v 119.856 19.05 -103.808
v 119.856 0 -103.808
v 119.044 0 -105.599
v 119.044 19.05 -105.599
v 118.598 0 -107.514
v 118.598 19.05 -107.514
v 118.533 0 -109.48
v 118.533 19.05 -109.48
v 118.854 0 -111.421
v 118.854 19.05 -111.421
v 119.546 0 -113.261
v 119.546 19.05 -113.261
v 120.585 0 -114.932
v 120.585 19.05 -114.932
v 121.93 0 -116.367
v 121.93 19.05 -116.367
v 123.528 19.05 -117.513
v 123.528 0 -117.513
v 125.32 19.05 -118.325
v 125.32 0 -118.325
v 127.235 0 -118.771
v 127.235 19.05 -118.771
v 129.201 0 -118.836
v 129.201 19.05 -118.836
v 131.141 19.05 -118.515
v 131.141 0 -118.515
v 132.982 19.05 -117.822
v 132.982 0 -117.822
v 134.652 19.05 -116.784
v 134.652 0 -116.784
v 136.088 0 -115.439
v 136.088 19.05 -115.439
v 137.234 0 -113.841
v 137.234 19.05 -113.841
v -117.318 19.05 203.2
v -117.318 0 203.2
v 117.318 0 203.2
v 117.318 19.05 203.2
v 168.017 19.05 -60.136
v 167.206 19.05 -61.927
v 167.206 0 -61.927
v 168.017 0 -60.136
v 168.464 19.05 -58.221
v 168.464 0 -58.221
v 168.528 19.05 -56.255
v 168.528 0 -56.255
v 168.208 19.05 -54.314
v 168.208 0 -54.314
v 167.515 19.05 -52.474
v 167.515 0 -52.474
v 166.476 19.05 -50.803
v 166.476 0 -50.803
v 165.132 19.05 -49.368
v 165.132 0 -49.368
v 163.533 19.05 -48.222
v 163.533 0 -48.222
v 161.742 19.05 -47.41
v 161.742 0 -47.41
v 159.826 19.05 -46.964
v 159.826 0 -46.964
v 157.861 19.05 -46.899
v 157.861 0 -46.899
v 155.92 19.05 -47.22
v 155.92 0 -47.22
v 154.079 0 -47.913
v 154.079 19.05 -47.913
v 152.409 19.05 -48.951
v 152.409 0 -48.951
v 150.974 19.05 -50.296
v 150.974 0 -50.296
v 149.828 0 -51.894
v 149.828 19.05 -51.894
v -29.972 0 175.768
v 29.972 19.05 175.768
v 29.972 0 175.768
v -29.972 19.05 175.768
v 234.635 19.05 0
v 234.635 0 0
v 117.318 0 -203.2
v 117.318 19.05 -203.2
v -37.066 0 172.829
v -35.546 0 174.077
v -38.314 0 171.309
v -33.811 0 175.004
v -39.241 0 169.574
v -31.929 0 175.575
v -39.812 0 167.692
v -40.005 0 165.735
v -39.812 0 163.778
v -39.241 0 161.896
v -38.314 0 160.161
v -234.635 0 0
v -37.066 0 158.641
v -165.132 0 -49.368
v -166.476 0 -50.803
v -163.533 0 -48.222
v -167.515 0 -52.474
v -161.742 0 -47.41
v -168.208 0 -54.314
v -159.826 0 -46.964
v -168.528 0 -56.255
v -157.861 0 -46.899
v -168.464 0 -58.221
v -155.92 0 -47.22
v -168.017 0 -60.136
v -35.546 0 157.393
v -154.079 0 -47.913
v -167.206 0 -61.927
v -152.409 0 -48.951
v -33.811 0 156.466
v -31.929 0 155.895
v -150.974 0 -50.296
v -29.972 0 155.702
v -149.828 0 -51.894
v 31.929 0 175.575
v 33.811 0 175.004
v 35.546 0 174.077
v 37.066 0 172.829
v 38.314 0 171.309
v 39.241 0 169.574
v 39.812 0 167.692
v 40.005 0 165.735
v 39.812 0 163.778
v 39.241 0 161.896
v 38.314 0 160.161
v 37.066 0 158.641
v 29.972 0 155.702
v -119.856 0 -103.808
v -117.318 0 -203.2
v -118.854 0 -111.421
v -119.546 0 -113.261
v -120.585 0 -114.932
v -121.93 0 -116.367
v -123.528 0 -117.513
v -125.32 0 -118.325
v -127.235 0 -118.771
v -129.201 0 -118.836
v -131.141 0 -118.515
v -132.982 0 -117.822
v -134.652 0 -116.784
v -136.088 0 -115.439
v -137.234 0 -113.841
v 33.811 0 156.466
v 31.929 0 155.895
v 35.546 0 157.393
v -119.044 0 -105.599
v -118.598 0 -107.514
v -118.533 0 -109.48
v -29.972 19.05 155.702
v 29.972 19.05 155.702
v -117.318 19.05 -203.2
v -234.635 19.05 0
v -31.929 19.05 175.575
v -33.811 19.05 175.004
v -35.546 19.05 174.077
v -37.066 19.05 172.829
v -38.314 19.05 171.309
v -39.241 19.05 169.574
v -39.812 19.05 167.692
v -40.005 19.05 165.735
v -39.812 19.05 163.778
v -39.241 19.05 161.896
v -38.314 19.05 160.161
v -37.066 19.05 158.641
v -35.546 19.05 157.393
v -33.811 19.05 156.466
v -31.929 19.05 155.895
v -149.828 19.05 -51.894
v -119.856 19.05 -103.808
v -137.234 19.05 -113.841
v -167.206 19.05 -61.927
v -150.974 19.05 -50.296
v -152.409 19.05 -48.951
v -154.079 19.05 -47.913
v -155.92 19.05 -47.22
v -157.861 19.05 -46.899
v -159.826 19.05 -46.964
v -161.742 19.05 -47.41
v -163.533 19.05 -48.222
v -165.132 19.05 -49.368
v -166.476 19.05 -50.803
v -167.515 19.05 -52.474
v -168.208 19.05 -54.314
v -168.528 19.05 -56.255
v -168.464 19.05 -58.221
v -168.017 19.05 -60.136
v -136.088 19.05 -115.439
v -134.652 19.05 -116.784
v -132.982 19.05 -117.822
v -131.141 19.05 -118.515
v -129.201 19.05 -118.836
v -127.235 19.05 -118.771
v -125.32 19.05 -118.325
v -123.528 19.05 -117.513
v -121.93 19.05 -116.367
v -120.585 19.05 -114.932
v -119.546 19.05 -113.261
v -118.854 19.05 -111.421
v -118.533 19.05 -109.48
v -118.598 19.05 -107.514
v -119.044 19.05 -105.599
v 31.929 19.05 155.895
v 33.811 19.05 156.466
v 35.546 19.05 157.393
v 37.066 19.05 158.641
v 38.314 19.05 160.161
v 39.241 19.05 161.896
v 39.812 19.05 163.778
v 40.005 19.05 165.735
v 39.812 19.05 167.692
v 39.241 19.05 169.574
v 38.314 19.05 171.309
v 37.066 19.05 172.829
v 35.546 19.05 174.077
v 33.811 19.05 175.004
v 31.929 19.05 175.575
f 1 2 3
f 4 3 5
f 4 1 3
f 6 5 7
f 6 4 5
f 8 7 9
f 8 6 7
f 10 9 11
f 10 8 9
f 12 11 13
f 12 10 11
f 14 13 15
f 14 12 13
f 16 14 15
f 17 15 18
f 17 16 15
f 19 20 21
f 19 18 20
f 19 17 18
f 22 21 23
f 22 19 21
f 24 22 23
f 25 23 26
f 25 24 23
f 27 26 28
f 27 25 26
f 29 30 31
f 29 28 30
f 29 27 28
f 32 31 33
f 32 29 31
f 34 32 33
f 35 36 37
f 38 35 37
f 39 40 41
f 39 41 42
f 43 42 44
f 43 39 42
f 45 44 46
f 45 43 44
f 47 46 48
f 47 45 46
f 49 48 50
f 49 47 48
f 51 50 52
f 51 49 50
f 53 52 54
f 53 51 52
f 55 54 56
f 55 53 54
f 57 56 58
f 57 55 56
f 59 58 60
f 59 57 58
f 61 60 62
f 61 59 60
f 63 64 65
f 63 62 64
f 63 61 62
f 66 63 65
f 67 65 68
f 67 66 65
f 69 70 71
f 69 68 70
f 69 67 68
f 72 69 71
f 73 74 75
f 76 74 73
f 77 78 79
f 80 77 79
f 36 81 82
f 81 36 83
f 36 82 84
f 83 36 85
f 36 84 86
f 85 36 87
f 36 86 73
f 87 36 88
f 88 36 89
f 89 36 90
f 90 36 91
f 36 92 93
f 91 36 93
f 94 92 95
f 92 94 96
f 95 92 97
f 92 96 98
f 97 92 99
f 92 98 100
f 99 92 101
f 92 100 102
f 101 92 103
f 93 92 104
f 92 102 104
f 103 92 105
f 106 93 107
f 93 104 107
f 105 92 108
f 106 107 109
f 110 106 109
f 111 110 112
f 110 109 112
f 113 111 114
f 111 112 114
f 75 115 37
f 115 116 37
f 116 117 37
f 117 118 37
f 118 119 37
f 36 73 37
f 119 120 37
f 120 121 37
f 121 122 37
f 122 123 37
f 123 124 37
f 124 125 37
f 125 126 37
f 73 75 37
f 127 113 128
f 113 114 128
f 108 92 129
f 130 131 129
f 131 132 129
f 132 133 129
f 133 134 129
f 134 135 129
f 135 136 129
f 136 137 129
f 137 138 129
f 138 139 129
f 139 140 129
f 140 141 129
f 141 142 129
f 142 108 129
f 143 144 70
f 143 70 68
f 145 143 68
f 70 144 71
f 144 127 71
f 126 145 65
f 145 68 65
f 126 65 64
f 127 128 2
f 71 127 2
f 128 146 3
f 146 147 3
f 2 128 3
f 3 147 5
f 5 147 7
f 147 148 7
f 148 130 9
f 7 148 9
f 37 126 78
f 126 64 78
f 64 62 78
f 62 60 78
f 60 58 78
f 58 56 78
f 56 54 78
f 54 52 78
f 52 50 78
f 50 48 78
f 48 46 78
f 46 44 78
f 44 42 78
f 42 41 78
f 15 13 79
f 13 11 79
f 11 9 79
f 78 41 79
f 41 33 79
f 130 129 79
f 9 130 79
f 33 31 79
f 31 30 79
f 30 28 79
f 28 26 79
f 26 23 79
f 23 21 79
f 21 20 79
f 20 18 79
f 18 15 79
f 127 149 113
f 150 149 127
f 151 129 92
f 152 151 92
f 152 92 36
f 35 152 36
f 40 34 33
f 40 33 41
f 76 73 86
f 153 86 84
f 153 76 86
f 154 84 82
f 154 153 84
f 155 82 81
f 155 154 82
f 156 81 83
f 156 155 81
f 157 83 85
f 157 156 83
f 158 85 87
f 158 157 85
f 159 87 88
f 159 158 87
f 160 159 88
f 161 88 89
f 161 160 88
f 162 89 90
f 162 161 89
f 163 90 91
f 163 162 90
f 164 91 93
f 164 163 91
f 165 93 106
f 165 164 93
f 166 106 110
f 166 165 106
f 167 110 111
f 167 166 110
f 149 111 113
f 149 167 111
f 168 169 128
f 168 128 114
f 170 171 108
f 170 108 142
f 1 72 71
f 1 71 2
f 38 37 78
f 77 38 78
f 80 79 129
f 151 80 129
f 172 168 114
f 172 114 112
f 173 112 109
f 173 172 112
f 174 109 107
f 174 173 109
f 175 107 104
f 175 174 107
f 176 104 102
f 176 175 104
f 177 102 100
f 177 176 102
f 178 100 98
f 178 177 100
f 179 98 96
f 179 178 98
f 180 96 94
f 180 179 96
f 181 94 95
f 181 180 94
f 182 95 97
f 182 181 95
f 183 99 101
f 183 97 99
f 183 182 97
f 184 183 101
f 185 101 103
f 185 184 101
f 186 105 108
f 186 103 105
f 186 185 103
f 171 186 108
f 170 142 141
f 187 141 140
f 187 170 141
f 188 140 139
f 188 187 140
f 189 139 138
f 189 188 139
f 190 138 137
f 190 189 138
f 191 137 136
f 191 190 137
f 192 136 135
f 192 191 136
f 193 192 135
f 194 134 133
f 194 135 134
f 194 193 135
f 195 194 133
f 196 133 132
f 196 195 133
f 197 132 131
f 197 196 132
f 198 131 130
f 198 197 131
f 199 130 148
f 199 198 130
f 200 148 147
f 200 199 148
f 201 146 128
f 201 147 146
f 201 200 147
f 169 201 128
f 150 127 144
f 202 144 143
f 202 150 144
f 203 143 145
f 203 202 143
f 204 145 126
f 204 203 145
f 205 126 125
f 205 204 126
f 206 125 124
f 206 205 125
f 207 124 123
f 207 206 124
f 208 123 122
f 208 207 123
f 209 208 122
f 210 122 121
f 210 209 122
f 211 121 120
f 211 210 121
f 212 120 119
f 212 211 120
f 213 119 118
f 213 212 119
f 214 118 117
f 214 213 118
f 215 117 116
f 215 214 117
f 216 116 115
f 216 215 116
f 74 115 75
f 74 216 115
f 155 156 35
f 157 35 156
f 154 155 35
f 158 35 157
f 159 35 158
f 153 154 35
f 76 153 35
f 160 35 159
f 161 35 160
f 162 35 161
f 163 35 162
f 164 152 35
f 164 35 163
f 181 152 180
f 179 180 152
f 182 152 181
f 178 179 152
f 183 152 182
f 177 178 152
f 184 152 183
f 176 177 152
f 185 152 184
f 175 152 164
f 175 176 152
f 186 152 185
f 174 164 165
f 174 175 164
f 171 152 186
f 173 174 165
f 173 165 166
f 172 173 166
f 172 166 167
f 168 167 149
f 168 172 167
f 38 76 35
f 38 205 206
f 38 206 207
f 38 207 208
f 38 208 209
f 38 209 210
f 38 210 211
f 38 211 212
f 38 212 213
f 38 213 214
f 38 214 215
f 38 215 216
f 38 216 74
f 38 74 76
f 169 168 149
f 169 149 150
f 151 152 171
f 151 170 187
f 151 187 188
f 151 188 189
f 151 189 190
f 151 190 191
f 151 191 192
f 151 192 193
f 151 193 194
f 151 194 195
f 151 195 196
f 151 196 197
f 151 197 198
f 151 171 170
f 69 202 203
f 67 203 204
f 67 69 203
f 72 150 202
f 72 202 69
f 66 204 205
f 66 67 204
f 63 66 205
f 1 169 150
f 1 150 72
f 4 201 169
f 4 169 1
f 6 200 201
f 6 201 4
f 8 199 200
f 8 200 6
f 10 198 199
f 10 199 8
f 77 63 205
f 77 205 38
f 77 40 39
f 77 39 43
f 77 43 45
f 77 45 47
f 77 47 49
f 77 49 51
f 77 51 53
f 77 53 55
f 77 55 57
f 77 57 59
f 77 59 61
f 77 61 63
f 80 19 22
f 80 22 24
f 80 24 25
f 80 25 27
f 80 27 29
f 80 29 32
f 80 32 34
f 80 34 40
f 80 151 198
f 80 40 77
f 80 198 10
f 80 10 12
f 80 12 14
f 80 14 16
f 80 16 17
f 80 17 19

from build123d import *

# Parameters (mm, degrees)
BOSS_EXTRUDE1_DEPTH = 19.05
CUT_EXTRUDE1_DEPTH  = 311.977162881


with BuildPart() as part:
    # Sketch1 → Boss-Extrude1 (new body)
    with BuildSketch(Plane(origin=(0, 0, 0), x_dir=(1, 0, 0), z_dir=(0, 1, 0))):
        Polygon((-234.635149399, 0), (-117.317574699, -203.2), (117.317574699, -203.2), (234.635149399, 0), (117.317574699, 203.2), (-117.317574699, 203.2), align=None)
    extrude(amount=BOSS_EXTRUDE1_DEPTH)

    # Sketch2 → Cut-Extrude1 (cut, through all)
    with BuildSketch(Plane(origin=(0, 19.05, 0), x_dir=(1, 0, 0), z_dir=(0, 1, 0))):
        with BuildLine():
            Line((-29.972, -155.702), (29.972, -155.702))
            ThreePointArc((29.972, -155.702), (40.005, -165.735), (29.972, -175.768))
            Line((29.972, -175.768), (-29.972, -175.768))
            ThreePointArc((-29.972, -175.768), (-40.005, -165.735), (-29.972, -155.702))
        make_face()
        with BuildLine():
            Line((-119.85588742, 103.807513402), (-149.82788742, 51.894486598))
            ThreePointArc((-149.82788742, 51.894486598), (-163.533220296, 48.222153722), (-167.205553172, 61.927486598))
            Line((-167.205553172, 61.927486598), (-137.233553172, 113.840513402))
            ThreePointArc((-137.233553172, 113.840513402), (-123.528220296, 117.512846278), (-119.85588742, 103.807513402))
        make_face()
        with BuildLine():
            Line((149.82788742, 51.894486598), (119.85588742, 103.807513402))
            ThreePointArc((119.85588742, 103.807513402), (123.528220296, 117.512846278), (137.233553172, 113.840513402))
            Line((137.233553172, 113.840513402), (167.205553172, 61.927486598))
            ThreePointArc((167.205553172, 61.927486598), (163.533220296, 48.222153722), (149.82788742, 51.894486598))
        make_face()
    extrude(amount=-CUT_EXTRUDE1_DEPTH, mode=Mode.SUBTRACT)


solid = part.part
